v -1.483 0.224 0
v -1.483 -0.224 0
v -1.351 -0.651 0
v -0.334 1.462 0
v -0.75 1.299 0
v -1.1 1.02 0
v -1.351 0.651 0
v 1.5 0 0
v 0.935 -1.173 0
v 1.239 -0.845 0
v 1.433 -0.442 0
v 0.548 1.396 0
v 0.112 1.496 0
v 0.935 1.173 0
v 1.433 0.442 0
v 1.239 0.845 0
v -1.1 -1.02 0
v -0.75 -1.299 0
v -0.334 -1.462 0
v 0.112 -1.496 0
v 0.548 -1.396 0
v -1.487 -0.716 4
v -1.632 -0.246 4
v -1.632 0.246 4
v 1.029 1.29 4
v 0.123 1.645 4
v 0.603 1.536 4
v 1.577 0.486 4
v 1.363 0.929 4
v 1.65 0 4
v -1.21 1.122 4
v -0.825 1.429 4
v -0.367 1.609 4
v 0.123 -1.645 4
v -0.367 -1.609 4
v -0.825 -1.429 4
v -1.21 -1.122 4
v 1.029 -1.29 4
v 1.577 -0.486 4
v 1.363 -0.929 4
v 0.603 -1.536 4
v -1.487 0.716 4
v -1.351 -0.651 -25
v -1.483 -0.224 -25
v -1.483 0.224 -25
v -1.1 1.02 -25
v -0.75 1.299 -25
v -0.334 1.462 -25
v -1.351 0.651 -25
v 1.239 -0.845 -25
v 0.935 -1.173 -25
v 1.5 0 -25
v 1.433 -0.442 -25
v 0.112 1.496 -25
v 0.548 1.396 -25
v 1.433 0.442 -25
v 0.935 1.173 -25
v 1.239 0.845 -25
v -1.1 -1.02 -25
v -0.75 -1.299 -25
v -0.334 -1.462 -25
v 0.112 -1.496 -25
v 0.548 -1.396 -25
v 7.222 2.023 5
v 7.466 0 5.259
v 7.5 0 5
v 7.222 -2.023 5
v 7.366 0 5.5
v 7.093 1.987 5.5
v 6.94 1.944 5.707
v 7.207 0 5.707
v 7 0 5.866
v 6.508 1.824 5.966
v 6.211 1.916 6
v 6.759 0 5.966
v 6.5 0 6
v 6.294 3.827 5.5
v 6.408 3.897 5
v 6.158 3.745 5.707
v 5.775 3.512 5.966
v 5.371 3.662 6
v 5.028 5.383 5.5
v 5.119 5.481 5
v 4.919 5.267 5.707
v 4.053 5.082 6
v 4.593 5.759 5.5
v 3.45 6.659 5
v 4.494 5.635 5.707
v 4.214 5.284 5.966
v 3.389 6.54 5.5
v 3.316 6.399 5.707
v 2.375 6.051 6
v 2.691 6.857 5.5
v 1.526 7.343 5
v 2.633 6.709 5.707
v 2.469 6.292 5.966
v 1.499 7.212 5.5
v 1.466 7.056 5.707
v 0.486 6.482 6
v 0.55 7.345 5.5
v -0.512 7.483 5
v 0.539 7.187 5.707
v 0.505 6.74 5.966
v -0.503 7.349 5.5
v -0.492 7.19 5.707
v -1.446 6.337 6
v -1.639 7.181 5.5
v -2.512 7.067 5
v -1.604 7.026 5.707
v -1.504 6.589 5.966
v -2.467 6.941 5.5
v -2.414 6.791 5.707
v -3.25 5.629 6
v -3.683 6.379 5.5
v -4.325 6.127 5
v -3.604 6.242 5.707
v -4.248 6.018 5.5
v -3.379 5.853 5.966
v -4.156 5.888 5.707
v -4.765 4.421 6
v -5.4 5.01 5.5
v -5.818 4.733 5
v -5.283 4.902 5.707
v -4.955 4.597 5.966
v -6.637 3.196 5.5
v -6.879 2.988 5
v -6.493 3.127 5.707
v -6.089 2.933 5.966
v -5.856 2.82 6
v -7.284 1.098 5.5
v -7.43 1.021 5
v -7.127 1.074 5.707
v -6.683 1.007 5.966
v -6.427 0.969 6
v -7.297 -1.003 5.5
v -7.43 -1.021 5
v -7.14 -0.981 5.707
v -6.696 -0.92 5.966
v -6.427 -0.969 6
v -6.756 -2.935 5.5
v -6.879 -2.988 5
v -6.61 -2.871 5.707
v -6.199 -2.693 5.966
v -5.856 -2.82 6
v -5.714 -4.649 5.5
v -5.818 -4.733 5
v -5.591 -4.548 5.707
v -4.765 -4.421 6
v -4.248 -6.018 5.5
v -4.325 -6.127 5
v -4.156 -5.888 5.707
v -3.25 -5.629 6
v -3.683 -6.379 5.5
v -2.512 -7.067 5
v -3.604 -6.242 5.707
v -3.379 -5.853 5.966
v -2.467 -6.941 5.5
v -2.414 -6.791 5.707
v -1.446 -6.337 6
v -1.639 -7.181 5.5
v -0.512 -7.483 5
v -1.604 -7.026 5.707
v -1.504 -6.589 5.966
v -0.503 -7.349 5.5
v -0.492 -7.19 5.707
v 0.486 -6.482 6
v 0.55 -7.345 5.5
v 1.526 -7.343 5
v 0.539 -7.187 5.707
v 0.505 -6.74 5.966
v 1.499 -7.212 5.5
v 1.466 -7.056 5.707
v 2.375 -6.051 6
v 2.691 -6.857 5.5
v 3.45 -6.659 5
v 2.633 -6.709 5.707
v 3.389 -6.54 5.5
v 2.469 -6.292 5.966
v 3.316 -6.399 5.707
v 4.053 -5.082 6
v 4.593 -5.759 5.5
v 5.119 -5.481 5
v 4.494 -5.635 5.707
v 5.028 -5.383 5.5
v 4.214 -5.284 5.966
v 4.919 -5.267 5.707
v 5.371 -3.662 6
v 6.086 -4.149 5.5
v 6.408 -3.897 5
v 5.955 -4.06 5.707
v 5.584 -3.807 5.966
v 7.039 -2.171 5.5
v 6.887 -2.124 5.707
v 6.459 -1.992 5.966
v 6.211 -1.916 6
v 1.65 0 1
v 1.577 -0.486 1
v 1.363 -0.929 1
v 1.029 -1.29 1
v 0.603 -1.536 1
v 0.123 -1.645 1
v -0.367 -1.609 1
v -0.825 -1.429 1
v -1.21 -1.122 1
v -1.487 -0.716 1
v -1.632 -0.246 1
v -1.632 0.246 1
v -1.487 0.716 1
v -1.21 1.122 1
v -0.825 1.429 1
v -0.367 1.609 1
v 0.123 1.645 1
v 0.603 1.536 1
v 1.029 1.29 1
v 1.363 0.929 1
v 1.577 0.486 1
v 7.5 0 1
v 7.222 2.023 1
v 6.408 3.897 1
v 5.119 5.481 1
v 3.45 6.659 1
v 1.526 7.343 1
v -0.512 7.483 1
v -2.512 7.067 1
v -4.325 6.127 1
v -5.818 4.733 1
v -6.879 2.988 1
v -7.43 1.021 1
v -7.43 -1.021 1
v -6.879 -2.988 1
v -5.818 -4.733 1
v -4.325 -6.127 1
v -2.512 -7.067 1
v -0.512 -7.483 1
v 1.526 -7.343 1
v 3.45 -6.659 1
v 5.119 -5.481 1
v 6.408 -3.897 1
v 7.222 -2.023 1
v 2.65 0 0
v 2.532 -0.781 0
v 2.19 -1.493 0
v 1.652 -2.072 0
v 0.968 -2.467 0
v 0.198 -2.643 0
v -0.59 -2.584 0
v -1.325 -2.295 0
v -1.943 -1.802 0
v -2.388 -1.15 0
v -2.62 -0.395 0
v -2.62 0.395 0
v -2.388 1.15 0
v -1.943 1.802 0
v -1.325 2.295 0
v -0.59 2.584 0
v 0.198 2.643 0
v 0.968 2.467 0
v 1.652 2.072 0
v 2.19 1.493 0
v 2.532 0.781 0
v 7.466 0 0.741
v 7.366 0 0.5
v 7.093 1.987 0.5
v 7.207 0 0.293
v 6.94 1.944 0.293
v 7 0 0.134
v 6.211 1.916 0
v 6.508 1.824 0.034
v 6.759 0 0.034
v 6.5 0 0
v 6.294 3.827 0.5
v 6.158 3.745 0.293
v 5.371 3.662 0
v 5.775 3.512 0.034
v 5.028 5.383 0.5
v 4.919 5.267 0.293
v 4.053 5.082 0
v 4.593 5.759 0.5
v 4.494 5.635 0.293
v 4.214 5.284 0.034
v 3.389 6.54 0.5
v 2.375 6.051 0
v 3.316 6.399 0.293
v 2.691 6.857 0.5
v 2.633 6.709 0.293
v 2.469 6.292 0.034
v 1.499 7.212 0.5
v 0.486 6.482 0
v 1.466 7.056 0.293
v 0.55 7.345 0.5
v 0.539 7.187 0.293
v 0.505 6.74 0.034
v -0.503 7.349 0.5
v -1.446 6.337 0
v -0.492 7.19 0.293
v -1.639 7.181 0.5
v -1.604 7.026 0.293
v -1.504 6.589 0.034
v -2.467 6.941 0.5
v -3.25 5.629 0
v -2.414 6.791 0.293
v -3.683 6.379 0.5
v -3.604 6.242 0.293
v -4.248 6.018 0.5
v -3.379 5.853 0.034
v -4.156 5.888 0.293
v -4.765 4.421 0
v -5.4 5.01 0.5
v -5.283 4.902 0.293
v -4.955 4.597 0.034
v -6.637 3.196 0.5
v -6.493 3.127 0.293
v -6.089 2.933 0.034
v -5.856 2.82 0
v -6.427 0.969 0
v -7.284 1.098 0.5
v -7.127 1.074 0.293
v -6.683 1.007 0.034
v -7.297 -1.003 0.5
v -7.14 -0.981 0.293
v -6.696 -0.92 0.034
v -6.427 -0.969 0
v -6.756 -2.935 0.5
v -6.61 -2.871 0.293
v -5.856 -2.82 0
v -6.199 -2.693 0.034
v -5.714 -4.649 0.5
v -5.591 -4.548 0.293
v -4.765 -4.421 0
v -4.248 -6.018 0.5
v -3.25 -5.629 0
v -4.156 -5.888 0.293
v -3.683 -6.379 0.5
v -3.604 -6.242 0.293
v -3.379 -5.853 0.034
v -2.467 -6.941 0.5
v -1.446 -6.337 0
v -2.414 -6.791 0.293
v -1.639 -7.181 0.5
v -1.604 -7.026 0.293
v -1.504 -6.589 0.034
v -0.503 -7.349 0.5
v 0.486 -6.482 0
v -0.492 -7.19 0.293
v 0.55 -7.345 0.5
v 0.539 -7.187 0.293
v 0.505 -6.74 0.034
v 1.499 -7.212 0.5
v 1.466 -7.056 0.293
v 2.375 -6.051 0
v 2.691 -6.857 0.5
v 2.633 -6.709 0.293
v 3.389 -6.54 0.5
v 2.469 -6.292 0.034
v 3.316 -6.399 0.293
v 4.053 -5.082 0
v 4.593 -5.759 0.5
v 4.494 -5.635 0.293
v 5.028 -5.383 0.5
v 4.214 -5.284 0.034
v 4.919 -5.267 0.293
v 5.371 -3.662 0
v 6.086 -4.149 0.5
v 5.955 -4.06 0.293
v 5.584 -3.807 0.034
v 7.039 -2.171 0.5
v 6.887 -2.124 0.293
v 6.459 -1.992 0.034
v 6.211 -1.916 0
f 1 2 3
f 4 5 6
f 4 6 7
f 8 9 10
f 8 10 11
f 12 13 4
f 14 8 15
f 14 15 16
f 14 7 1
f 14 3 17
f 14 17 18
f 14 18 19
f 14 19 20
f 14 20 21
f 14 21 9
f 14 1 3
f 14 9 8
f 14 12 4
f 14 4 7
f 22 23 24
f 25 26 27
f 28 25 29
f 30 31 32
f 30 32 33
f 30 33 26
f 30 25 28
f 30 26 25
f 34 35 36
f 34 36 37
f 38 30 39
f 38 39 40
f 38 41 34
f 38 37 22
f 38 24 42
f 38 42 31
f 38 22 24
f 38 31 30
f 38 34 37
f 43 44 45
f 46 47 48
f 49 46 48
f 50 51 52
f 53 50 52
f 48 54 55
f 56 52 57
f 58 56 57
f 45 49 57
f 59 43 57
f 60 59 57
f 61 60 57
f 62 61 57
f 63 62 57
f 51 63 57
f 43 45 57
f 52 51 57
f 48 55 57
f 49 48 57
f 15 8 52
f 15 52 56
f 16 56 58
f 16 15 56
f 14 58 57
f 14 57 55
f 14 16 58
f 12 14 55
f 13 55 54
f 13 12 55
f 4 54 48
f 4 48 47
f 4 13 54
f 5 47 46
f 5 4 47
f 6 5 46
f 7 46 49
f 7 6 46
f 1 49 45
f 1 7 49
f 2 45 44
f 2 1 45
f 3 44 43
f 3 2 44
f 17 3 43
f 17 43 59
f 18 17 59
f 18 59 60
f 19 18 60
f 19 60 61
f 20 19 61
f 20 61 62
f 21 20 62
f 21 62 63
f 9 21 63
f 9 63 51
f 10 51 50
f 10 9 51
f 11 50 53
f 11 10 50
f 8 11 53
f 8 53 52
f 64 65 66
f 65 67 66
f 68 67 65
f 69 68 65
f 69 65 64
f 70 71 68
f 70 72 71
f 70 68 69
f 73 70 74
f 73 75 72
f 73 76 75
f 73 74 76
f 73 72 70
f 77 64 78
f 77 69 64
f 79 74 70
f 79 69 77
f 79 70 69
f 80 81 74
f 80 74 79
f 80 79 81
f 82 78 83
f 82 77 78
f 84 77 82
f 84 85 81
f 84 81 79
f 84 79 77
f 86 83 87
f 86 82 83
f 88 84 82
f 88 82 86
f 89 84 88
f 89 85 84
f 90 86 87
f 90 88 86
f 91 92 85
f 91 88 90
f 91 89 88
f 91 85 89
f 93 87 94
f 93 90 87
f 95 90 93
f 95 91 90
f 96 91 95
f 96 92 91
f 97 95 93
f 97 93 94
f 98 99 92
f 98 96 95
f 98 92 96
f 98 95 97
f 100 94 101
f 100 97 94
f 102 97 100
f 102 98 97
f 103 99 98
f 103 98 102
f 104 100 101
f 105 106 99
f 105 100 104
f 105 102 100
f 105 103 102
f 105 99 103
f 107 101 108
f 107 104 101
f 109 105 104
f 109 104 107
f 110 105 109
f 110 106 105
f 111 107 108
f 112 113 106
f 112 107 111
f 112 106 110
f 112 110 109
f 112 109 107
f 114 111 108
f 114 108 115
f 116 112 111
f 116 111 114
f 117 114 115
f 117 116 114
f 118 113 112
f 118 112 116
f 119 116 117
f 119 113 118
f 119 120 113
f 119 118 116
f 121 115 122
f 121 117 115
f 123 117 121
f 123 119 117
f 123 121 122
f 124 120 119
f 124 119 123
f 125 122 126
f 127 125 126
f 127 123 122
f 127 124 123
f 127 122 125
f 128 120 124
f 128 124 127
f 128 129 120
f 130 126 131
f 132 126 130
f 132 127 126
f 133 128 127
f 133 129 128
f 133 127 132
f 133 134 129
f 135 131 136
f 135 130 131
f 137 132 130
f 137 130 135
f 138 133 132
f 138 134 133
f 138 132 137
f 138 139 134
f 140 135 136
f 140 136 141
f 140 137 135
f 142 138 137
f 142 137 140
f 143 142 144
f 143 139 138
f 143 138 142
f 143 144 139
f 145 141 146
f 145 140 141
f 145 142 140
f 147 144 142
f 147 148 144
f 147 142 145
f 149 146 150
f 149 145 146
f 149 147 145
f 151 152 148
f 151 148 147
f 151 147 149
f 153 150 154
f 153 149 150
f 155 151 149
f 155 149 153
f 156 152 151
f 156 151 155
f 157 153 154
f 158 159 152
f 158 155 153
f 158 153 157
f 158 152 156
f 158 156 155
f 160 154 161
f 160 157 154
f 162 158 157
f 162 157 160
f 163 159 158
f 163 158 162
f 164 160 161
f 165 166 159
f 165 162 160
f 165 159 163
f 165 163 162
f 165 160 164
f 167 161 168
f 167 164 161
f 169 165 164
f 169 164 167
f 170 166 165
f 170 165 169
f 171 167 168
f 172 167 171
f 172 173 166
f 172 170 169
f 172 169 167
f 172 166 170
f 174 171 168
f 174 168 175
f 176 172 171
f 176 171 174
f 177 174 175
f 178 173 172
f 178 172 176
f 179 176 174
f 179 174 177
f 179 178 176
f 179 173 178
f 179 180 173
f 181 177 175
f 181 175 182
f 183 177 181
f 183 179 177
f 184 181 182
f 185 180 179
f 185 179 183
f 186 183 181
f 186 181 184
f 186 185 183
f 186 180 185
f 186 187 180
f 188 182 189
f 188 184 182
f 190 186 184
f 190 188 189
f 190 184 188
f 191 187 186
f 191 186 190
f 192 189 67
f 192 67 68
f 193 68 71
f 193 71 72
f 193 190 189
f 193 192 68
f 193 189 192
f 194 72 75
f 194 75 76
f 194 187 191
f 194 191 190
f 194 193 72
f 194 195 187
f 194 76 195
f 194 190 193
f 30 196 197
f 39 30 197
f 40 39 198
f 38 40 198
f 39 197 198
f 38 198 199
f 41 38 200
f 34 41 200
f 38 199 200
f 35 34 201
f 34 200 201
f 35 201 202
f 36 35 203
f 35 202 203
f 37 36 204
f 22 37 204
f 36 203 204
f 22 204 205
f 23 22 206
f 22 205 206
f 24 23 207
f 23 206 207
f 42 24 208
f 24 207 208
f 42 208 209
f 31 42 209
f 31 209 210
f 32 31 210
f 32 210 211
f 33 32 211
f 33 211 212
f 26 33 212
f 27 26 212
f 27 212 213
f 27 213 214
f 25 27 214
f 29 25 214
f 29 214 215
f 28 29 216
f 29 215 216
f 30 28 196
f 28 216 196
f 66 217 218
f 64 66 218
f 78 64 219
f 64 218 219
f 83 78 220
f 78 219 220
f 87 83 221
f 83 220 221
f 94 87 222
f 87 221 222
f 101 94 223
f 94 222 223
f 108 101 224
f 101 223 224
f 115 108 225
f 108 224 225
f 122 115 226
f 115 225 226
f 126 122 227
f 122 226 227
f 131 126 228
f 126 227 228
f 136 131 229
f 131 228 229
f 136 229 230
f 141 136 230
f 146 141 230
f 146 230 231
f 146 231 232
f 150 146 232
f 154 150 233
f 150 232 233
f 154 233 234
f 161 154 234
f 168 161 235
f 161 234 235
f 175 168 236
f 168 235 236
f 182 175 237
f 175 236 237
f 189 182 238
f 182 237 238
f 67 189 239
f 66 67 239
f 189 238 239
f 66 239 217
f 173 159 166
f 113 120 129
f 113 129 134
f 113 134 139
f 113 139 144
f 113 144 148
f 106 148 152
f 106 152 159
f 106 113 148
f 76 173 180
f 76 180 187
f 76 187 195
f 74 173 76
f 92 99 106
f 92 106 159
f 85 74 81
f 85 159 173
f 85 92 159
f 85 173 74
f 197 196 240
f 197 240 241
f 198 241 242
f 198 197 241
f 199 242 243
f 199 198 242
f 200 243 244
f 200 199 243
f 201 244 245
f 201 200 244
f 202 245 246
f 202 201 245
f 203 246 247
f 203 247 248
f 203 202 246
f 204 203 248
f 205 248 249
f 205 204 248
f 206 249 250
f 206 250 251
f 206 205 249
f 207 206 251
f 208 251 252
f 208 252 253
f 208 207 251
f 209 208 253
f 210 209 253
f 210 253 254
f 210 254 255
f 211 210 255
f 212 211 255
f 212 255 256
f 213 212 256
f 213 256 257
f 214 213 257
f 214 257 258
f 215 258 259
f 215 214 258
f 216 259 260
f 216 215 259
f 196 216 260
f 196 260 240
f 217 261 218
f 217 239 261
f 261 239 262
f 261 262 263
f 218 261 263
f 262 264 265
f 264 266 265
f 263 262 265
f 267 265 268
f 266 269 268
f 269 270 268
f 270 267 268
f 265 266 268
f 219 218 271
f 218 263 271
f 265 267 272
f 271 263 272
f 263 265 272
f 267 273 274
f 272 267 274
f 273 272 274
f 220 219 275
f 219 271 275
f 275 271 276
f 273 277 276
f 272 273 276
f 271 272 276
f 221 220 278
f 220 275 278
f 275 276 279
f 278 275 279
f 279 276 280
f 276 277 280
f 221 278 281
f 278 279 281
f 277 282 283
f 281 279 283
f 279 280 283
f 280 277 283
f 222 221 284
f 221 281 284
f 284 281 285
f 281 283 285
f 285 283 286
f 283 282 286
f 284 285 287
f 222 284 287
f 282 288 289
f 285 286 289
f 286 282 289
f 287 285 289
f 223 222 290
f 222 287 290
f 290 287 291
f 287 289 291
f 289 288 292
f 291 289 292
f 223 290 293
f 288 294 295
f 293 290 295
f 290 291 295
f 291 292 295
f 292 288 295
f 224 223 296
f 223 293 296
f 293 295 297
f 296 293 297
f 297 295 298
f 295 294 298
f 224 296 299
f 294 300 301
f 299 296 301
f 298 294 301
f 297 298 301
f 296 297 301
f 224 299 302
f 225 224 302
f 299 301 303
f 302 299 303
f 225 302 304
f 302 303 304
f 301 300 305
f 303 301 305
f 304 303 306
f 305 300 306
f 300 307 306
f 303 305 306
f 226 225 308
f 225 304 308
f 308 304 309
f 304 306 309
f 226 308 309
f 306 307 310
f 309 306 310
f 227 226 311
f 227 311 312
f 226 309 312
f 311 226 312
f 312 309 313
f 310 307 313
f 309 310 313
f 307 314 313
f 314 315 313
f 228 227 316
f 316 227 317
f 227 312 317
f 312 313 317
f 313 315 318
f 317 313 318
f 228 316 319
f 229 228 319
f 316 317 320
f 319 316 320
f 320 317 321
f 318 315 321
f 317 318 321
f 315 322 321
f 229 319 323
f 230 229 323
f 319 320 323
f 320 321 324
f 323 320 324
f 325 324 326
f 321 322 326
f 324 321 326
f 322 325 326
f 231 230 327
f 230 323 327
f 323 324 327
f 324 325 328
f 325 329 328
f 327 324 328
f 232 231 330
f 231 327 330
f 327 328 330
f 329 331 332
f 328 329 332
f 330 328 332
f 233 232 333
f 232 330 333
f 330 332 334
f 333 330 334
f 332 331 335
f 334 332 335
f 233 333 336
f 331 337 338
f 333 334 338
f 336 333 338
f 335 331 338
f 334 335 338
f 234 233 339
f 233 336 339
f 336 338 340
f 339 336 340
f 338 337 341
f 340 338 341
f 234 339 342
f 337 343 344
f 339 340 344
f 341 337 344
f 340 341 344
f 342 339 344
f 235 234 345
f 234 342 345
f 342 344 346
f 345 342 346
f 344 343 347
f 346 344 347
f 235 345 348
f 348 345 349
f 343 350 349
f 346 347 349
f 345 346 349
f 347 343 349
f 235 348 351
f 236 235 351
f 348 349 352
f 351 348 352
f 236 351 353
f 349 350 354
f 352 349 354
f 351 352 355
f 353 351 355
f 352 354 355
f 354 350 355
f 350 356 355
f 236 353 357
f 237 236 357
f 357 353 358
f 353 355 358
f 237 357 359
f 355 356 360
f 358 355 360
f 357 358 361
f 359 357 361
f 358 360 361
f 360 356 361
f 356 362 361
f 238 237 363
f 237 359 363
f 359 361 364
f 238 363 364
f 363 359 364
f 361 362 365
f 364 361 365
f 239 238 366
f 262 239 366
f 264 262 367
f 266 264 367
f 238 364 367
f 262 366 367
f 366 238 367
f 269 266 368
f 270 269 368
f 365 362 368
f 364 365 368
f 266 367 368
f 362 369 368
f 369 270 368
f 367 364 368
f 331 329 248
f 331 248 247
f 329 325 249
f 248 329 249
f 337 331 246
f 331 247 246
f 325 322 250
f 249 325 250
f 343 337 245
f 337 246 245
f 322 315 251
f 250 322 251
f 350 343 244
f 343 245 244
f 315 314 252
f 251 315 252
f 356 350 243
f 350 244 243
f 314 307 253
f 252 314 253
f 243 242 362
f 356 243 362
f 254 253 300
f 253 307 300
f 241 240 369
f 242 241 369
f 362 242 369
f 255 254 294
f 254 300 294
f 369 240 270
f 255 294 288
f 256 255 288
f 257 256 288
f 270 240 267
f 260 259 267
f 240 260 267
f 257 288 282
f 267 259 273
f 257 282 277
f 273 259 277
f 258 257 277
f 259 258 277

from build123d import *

# Parameters (mm, degrees)
SKETCH_R     = 7.5
PAD_DEPTH    = 6
FILLET_R     = 1
SKETCH001_R  = 1.65
POCKET_DEPTH = 4
CHAMFER_SIZE = 1
SKETCH002_R  = 1.5
PAD001_DEPTH = 25


with BuildPart() as rueda:
    # Sketch → Pad (new body)
    with BuildSketch(Plane.XY):
        Circle(SKETCH_R)
    extrude(amount=PAD_DEPTH)

    # Fillet
    fillet_edges = [rueda.edges().sort_by_distance(p)[0] for p in [
        (-7.5, 0, 6),
        (-7.5, 0, 0),
    ]]
    fillet(fillet_edges, radius=FILLET_R)

    # Sketch001 (on Face4 of Fillet) → Pocket (cut)
    with BuildSketch(Plane(origin=(0, 0, 0), x_dir=(1, 0, 0), z_dir=(0, 0, -1))):
        Circle(SKETCH001_R)
    extrude(amount=-POCKET_DEPTH, mode=Mode.SUBTRACT)

    # Chamfer
    chamfer_edges = [rueda.edges().sort_by_distance(p)[0] for p in [
        (-1.65, 0, 0),
    ]]
    chamfer(chamfer_edges, length=CHAMFER_SIZE)


with BuildPart() as eje:
    # Sketch002 → Pad001 (new body)
    with BuildSketch(Plane.XY):
        Circle(SKETCH002_R)
    extrude(amount=-PAD001_DEPTH)


solid = Compound([rueda.part, eje.part])
